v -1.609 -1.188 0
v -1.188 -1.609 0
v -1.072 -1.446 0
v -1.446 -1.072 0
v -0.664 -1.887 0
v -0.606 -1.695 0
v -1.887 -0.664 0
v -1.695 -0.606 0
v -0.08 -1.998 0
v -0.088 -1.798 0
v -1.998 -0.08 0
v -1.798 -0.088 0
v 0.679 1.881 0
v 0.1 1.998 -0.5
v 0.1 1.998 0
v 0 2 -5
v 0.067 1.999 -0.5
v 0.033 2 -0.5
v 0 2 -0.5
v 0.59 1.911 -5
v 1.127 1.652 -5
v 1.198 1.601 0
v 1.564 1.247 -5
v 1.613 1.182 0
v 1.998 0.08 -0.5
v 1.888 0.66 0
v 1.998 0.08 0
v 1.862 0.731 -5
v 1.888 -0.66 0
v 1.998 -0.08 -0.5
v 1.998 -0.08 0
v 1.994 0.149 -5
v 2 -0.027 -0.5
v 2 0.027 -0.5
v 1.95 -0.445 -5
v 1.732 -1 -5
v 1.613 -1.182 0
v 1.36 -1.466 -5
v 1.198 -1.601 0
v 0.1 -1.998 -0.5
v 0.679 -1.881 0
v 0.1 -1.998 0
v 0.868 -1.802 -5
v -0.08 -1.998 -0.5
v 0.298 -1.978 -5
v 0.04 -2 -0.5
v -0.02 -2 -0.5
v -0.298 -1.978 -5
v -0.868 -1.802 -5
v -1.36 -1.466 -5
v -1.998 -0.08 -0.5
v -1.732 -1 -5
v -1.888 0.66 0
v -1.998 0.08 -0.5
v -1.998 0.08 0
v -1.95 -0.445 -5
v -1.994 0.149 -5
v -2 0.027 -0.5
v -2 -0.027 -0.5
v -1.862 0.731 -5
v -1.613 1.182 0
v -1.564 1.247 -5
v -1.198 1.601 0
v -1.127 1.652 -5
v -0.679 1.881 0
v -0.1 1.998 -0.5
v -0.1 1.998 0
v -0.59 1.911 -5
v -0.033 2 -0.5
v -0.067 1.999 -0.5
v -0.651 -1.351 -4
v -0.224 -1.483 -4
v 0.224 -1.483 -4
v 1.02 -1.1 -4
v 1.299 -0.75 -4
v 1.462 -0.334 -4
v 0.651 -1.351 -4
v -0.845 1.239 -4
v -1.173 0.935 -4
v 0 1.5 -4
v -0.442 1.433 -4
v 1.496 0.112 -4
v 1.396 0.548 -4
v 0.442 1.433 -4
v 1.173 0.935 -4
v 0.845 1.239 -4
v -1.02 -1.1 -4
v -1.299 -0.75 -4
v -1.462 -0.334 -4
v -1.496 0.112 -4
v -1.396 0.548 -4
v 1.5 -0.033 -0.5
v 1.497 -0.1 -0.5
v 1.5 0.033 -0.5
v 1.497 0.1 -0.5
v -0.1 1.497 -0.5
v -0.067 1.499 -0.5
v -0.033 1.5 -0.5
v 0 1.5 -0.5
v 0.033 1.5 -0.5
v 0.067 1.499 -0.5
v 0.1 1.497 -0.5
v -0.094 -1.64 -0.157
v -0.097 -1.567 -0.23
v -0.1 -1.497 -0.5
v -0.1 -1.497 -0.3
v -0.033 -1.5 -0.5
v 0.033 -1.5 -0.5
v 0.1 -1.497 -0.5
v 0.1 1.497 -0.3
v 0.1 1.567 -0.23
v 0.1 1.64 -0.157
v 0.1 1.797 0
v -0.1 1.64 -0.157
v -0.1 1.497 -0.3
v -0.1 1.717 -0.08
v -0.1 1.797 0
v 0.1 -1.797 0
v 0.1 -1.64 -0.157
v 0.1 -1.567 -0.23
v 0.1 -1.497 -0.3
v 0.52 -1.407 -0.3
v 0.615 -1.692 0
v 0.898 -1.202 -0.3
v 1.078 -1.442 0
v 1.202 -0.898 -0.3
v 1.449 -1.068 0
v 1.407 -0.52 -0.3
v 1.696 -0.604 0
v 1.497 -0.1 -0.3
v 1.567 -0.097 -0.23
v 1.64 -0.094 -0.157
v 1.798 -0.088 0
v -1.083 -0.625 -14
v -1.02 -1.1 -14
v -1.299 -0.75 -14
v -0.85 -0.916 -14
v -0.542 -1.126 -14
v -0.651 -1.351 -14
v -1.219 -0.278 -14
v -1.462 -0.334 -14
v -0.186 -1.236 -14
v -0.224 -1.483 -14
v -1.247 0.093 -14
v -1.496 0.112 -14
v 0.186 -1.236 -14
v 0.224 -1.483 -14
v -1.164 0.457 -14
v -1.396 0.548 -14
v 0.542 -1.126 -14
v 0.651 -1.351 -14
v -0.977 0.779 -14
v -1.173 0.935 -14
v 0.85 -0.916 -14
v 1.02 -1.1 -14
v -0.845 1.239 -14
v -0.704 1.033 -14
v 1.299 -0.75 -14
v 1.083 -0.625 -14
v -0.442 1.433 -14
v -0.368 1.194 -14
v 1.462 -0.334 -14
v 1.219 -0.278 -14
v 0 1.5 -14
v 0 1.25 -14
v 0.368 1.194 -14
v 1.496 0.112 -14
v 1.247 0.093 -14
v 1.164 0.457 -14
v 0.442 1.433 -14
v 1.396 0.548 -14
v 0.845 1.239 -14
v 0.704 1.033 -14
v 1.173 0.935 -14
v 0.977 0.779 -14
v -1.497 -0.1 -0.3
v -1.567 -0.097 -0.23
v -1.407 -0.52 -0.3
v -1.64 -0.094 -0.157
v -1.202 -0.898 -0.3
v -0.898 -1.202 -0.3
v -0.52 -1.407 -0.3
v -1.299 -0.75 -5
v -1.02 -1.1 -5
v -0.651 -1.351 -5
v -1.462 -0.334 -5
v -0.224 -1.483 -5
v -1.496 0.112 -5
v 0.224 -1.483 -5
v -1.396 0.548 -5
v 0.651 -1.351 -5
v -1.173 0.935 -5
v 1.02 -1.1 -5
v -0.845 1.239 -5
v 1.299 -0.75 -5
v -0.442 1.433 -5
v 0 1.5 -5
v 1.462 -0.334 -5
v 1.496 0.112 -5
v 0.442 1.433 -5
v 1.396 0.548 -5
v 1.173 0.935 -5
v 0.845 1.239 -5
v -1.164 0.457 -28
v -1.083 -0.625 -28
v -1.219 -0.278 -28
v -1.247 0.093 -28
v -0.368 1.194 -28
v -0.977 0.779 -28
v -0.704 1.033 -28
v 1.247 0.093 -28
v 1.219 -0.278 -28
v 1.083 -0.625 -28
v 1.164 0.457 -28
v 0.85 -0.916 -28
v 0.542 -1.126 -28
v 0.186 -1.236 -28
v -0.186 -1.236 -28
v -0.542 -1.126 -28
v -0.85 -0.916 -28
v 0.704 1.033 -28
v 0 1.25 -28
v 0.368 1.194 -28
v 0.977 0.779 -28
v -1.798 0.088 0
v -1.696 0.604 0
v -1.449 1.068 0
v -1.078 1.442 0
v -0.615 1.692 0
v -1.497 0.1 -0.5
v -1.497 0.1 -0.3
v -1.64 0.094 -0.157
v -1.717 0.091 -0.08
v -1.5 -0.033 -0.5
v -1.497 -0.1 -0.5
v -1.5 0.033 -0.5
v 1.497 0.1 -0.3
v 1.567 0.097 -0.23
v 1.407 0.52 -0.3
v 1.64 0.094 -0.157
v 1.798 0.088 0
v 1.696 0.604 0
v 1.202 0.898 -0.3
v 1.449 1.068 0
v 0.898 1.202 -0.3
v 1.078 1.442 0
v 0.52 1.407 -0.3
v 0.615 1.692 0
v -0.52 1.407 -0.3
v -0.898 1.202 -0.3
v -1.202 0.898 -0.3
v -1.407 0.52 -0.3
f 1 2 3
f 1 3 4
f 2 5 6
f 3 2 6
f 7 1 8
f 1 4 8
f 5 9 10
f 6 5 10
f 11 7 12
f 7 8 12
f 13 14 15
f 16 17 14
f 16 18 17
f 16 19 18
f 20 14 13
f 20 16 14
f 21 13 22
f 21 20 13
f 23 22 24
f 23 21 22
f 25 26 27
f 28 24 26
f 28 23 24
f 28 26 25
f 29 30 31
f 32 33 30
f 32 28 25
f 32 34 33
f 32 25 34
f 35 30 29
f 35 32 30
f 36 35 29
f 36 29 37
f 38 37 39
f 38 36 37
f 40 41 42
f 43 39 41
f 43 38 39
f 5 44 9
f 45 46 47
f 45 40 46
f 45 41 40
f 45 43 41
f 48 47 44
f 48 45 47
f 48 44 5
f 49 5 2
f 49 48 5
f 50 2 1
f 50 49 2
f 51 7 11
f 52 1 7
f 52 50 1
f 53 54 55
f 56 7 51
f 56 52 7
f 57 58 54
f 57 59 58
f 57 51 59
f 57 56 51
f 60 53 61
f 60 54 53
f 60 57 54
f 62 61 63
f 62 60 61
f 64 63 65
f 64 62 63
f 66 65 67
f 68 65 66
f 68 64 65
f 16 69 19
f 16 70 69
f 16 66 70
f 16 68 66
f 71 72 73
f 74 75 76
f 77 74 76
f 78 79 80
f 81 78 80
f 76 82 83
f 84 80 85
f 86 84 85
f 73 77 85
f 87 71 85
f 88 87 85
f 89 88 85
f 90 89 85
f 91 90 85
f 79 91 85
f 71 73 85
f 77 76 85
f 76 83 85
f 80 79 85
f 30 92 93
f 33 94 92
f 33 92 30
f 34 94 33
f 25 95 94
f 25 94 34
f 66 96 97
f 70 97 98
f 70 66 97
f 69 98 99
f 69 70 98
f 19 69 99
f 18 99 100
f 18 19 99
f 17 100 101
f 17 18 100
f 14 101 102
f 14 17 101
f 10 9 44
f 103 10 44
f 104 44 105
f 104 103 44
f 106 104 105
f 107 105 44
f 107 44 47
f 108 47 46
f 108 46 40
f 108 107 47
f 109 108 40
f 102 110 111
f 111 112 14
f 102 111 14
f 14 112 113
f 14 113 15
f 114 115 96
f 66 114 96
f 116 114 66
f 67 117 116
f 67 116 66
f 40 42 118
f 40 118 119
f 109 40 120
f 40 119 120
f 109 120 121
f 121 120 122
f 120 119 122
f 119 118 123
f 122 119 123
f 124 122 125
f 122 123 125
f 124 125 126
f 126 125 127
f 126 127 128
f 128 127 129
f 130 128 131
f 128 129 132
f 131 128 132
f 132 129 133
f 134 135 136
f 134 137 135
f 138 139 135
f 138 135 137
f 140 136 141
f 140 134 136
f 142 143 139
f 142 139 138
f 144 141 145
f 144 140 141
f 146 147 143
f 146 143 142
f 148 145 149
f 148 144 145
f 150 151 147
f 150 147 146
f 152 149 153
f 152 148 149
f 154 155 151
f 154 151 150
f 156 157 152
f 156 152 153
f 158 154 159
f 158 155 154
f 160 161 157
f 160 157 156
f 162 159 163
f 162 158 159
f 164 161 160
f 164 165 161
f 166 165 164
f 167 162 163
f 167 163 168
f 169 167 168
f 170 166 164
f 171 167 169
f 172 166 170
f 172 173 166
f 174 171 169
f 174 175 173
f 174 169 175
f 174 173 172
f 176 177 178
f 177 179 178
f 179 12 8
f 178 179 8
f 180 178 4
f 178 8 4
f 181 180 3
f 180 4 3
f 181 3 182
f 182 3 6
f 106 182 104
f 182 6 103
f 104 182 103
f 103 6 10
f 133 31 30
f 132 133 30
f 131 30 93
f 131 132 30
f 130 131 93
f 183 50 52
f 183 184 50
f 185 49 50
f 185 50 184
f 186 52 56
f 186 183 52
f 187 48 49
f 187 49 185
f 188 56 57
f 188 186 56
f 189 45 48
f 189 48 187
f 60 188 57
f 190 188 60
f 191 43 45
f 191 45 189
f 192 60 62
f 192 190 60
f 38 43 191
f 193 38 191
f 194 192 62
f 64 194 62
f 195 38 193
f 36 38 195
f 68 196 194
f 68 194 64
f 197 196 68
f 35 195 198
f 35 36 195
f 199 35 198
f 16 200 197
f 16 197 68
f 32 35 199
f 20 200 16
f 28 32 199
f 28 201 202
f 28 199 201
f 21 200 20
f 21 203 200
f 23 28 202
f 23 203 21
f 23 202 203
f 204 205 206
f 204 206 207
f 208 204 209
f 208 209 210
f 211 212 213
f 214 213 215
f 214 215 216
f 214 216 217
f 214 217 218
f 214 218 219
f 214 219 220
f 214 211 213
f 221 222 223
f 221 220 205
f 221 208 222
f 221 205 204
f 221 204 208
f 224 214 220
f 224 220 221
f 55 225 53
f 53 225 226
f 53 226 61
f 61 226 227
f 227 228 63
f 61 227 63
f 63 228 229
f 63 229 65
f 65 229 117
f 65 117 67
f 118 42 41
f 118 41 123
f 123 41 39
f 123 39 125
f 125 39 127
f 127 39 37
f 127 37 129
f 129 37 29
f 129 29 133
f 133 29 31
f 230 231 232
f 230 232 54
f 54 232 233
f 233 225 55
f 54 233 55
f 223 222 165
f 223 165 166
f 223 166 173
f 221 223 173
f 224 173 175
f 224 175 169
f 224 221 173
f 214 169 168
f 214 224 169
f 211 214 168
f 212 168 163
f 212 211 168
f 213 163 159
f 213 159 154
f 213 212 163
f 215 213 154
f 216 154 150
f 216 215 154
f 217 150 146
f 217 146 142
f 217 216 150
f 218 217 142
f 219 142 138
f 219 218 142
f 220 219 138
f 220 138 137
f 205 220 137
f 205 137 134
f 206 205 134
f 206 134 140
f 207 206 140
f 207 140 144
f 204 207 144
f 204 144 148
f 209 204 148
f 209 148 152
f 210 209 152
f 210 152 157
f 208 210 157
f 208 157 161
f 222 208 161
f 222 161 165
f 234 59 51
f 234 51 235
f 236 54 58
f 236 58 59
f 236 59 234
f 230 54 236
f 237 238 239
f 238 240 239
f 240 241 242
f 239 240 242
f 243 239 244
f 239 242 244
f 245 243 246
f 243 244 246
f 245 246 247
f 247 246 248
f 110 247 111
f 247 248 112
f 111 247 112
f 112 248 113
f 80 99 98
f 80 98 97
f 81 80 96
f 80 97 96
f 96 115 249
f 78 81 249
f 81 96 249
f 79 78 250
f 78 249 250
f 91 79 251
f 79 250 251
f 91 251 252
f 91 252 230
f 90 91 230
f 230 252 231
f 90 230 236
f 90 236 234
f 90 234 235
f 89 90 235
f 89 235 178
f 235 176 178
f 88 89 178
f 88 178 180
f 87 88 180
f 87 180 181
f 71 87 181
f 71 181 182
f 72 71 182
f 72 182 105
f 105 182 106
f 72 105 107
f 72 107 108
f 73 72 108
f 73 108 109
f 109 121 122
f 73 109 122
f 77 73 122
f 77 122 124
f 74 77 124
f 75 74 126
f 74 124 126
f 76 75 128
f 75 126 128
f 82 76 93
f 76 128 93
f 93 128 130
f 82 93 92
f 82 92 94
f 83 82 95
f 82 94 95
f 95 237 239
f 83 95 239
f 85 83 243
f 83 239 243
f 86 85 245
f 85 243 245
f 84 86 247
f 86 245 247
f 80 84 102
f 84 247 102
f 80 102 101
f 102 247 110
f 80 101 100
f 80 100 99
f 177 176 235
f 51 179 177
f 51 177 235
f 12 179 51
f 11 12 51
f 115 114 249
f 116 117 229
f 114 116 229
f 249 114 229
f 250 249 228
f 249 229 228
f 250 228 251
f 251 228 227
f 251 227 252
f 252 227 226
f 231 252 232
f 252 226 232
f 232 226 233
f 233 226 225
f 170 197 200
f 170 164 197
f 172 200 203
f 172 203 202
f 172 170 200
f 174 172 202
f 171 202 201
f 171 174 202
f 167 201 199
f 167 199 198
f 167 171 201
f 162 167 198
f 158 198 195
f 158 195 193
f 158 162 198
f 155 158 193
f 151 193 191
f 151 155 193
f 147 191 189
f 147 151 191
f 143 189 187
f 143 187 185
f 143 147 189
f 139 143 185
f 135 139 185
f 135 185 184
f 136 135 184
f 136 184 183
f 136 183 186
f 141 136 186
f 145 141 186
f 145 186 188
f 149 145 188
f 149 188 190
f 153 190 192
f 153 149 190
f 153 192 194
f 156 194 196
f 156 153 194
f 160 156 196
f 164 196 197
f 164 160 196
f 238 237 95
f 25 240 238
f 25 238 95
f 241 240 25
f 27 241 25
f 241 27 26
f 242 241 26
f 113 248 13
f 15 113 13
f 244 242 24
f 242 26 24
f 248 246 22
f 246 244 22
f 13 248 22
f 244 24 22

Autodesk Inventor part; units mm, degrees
ref_plane "YZ Plane" through (0, 0, 0) normal (1, 0, 0) x (0, 1, 0)
ref_plane "XZ Plane" through (0, 0, 0) normal (0, 1, 0) x (-1, 0, 0)
ref_plane "XY Plane" through (0, 0, 0) normal (0, 0, 1) x (1, 0, 0)
sketch "Sketch1" plane through (0, 0, 0) normal (1, 0, 0) x (0, 1, 0)
  line L0 (0, 0) -> (0, -28) construction
  line L1 (0, 0) -> (2, 0)
  line L2 (2, 0) -> (2, -5)
  line L3 (2, -5) -> (0, -5)
  line L4 (0, -5) -> (0, 0)
  line L5 (0, -5) -> (1.5, -5)
  line L6 (1.5, -5) -> (1.5, -14)
  line L7 (1.5, -14) -> (0, -14)
  line L8 (0, -14) -> (0, -5)
  line L9 (0, -14) -> (1.25, -14)
  line L10 (1.25, -14) -> (1.25, -28)
  line L11 (1.25, -28) -> (0, -28)
  line L12 (0, -28) -> (0, -14)
  line L13 (1.5, -4) -> (1.5, 0)
  line L14 (0, -4) -> (1.5, -4)
  line L15 (2, 0) -> (1.5, 0)
  line L16 (0, -4) -> (0, -5)
  dimension "d0" = 28
  dimension "d2" = 5
  dimension "d5" = 9
  dimension "d6" = 3
  dimension "d7" = 1.25
  dimension "d23" = 4
  dimension "d24" = 0.5
revolve "Revolution1" add sketch "Sketch1" angle 360 about axis through (0, 0, 0) along (0, 0, -1) contours L1 L2 L3 L4 L14 L13 | L3 L6 L7 L8 | L7 L10 L11 L12
sketch "Sketch2" plane through (0, 0, 0) normal (0, 0, 1) x (1, 0, 0)
  line L0 (0, 0) -> (0, 5.9662) construction
  circle A0 centre (0, 0) radius 2 projected
  line L1 (0, 0) -> (0, -6.6565) construction
  line L2 (0, 0) -> (4.6514, 0) construction
  line L3 (0, 0) -> (-5.9334, 0) construction
  line L4 (1.9984, -0.08) -> (1.4967, -0.1)
  line L5 (0.1, -1.9975) -> (0.1, -1.4967)
  line L6 (1.4967, -0.1) -> (1.9984, -0.08)
  circle A1 centre (0, 0) radius 1.5 projected
  line L7 (0.1, 1.4967) -> (0.1, 1.9975)
  line L8 (-0.1, 1.4967) -> (-0.1, 1.9975)
  line L9 (-1.4967, 0.1) -> (-1.9984, 0.08)
  line L10 (-1.4967, -0.1) -> (-1.9984, -0.08)
  line L11 (-0.08, -1.9984) -> (-0.1, -1.4967)
  line L12 (1.4967, 0.1) -> (1.9984, 0.08)
  line L13 (1.9984, 0.08) -> (1.4967, 0.1)
  dimension "d14" = 0.1
extrude "Extrusion1" cut sketch "Sketch2" against normal blind 0.5 contours A0 L4 A1 L12 | L7 A1 L8 A0 | A0 L11 A1 L5 | L9 A1 L10 A0
chamfer "Chamfer1" distance 0.3 angle 45 4 edges at (1.0607, 1.0607, 0) (-1.0607, 1.0607, 0) (-1.0607, -1.0607, 0) (1.0607, -1.0607, 0)
thread "Thread1" size "M2.5x0.45" class "6g" standard "ANSI Metric M Profile" length 6 offset 8
properties part number "PINO DO BLOCO DE CONTATO" material "Aluminum 6061-AHC"
